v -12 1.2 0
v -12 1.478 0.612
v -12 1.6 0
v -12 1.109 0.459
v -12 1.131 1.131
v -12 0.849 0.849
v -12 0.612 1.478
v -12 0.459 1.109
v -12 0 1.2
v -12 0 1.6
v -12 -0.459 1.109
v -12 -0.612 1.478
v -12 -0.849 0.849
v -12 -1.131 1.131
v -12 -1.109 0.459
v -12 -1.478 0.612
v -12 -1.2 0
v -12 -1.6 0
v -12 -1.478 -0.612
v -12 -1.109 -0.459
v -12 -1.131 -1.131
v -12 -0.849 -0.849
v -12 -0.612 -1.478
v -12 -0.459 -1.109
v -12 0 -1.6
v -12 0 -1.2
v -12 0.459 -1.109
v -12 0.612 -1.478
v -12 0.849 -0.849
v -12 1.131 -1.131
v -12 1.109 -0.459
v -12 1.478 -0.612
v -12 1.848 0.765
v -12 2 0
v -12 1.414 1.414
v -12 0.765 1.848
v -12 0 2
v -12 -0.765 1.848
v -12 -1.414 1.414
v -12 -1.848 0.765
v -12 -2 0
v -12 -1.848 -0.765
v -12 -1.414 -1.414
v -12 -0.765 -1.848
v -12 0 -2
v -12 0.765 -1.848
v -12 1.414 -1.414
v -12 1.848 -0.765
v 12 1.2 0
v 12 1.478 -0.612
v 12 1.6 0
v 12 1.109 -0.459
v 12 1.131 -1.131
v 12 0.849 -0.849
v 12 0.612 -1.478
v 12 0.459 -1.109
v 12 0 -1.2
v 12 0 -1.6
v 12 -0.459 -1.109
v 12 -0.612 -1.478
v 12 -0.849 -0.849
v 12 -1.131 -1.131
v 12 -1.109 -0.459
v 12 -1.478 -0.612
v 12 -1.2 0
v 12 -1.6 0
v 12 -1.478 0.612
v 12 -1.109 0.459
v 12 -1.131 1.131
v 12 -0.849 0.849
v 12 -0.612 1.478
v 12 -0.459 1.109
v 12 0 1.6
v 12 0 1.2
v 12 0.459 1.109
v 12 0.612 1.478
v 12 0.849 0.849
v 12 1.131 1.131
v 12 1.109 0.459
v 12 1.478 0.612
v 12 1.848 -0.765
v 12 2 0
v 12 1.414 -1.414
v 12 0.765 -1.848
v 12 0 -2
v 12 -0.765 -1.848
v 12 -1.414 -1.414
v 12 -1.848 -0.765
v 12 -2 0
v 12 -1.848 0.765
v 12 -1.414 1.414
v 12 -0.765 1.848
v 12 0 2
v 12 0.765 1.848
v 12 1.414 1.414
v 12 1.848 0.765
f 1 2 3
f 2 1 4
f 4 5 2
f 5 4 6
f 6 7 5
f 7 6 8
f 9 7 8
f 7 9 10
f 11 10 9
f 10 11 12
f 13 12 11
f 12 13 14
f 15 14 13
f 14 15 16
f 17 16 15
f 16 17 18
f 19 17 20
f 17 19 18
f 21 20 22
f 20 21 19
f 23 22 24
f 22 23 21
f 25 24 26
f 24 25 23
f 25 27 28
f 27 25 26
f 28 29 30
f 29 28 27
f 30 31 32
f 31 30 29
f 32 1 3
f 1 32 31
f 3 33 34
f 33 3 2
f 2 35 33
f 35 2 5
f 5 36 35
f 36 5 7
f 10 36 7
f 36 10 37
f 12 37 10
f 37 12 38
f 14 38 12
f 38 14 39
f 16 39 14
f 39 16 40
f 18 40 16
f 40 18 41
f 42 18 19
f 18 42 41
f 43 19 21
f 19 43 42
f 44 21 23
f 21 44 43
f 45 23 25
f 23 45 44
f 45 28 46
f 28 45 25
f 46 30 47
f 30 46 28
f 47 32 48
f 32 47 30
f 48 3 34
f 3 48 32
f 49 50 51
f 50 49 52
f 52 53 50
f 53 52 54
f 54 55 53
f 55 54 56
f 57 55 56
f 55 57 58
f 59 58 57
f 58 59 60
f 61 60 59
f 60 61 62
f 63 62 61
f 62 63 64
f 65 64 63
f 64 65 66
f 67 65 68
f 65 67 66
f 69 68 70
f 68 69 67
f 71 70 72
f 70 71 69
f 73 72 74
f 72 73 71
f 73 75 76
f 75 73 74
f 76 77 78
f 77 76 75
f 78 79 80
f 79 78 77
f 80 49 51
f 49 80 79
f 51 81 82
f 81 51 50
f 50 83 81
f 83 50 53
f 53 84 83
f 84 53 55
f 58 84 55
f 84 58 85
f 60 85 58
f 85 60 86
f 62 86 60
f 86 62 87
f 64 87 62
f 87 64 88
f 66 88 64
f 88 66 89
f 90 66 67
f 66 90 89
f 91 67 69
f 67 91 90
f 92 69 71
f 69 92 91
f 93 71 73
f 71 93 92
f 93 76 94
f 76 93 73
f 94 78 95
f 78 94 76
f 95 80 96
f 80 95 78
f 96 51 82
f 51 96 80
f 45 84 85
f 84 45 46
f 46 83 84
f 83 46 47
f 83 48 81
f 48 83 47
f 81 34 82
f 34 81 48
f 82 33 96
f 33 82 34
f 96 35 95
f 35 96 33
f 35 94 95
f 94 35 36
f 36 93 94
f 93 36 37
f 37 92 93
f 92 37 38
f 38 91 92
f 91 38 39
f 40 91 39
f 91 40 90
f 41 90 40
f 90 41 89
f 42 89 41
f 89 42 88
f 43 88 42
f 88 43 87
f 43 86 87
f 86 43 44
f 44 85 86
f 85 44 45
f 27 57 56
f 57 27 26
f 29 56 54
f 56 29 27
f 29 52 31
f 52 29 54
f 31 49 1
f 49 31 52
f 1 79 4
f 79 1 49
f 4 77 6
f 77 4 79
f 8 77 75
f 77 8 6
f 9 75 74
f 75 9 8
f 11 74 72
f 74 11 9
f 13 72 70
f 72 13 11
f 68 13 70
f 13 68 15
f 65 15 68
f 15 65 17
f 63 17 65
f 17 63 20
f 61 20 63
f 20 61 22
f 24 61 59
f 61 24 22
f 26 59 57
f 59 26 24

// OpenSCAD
// file: ../p/4-4disc.scad
use <../lib.scad>
$fa=1; $fs=0.2;
function ldraw_lib__4_4disc(realsolid=false) = [
// 0 Disc 1.0
// 0 Name: 4-4disc.dat
// 0 Author: James Jessiman
// 0 !LDRAW_ORG Primitive UPDATE 2002-02
// 0 !LICENSE Licensed under CC BY 2.0 and CC BY 4.0 : see CAreadme.txt
// 
// 0 BFC CERTIFY CCW
  [0,"BFC","CERTIFY"],
  [0,"BFC","CCW"],
// 
// 0 !HISTORY 1998-12-15 [PTadmin] Official Update 1998-10
// 0 !HISTORY 2002-03-23 [sbliss] Added BFC statement
// 0 !HISTORY 2002-04-25 [PTadmin] Official Update 2002-02
// 0 !HISTORY 2007-06-24 [PTadmin] Header formatted for Contributor Agreement
// 0 !HISTORY 2008-07-01 [PTadmin] Official Update 2008-01
// 
// 
// 3 16 0 0 0 1 0 0 0.9239 0 0.3827
  [3,16,0,0,0,1,0,0,0.9239,0,0.3827],
// 3 16 0 0 0 0.9239 0 0.3827 0.7071 0 0.7071
  [3,16,0,0,0,0.9239,0,0.3827,0.7071,0,0.7071],
// 3 16 0 0 0 0.7071 0 0.7071 0.3827 0 0.9239
  [3,16,0,0,0,0.7071,0,0.7071,0.3827,0,0.9239],
// 3 16 0 0 0 0.3827 0 0.9239 0 0 1
  [3,16,0,0,0,0.3827,0,0.9239,0,0,1],
// 3 16 0 0 0 0 0 1 -0.3827 0 0.9239
  [3,16,0,0,0,0,0,1,-0.3827,0,0.9239],
// 3 16 0 0 0 -0.3827 0 0.9239 -0.7071 0 0.7071
  [3,16,0,0,0,-0.3827,0,0.9239,-0.7071,0,0.7071],
// 3 16 0 0 0 -0.7071 0 0.7071 -0.9239 0 0.3827
  [3,16,0,0,0,-0.7071,0,0.7071,-0.9239,0,0.3827],
// 3 16 0 0 0 -0.9239 0 0.3827 -1 0 -0
  [3,16,0,0,0,-0.9239,0,0.3827,-1,0,-0],
// 3 16 0 0 0 -1 0 -0 -0.9239 0 -0.3827
  [3,16,0,0,0,-1,0,-0,-0.9239,0,-0.3827],
// 3 16 0 0 0 -0.9239 0 -0.3827 -0.7071 0 -0.7071
  [3,16,0,0,0,-0.9239,0,-0.3827,-0.7071,0,-0.7071],
// 3 16 0 0 0 -0.7071 0 -0.7071 -0.3827 0 -0.9239
  [3,16,0,0,0,-0.7071,0,-0.7071,-0.3827,0,-0.9239],
// 3 16 0 0 0 -0.3827 0 -0.9239 0 0 -1
  [3,16,0,0,0,-0.3827,0,-0.9239,0,0,-1],
// 3 16 0 0 0 0 0 -1 0.3827 0 -0.9239
  [3,16,0,0,0,0,0,-1,0.3827,0,-0.9239],
// 3 16 0 0 0 0.3827 0 -0.9239 0.7071 0 -0.7071
  [3,16,0,0,0,0.3827,0,-0.9239,0.7071,0,-0.7071],
// 3 16 0 0 0 0.7071 0 -0.7071 0.9239 0 -0.3827
  [3,16,0,0,0,0.7071,0,-0.7071,0.9239,0,-0.3827],
// 3 16 0 0 0 0.9239 0 -0.3827 1 0 0
  [3,16,0,0,0,0.9239,0,-0.3827,1,0,0],
// 0
];
module ldraw_lib__4_4disc(step=0, col=false, unit=2/5, alt=false, line=0.2, solid=!$preview)
    makepoly(ldraw_lib__4_4disc(solid), step=step, col=col, unit=unit, alt=alt, line=line, solid=solid);
ldraw_lib__4_4disc(line=0.2);
// file: ../p/stud3.scad
use <../lib.scad>
use <4-4cyli.scad>
use <4-4disc.scad>
use <4-4edge.scad>
$fa=1; $fs=0.2;
function ldraw_lib__stud3(realsolid=false) = realsolid ? 
    [openscad(translate([0,0,-eps()], o=cylinder(4+eps(), r=4)),2)] : [
// 0 Stud Tube Solid
// 0 Name: stud3.dat
// 0 Author: James Jessiman
// 0 !LDRAW_ORG Primitive UPDATE 2012-01
// 0 !LICENSE Licensed under CC BY 2.0 and CC BY 4.0 : see CAreadme.txt
// 
// 0 BFC CERTIFY CCW
  [0,"BFC","CERTIFY"],
  [0,"BFC","CCW"],
// 
// 0 !HISTORY 2002-04-04 [sbliss] Modified for BFC compliance
// 0 !HISTORY 2002-04-25 [PTadmin] Official Update 2002-02
// 0 !HISTORY 2007-06-24 [PTadmin] Header formatted for Contributor Agreement
// 0 !HISTORY 2008-07-01 [PTadmin] Official Update 2008-01
// 0 !HISTORY 2012-02-16 [Philo] Changed to CCW
// 0 !HISTORY 2012-03-30 [PTadmin] Official Update 2012-01
// 
// 
// 1 16 0 -4 0 4 0 0 0 1 0 0 0 4 4-4edge.dat
  [1,16,0,-4,0,4,0,0,0,1,0,0,0,4, ldraw_lib__4_4edge(realsolid)],
// 1 16 0 0 0 4 0 0 0 1 0 0 0 4 4-4edge.dat
  [1,16,0,0,0,4,0,0,0,1,0,0,0,4, ldraw_lib__4_4edge(realsolid)],
// 1 16 0 -4 0 4 0 0 0 1 0 0 0 4 4-4disc.dat
  [1,16,0,-4,0,4,0,0,0,1,0,0,0,4, ldraw_lib__4_4disc(realsolid)],
// 1 16 0 -4 0 4 0 0 0 4 0 0 0 4 4-4cyli.dat
  [1,16,0,-4,0,4,0,0,0,4,0,0,0,4, ldraw_lib__4_4cyli(realsolid)],
];
module ldraw_lib__stud3(step=0, col=false, unit=2/5, alt=false, line=0.2, solid=!$preview)
    makepoly(ldraw_lib__stud3(solid), step=step, col=col, unit=unit, alt=alt, line=line, solid=solid);
ldraw_lib__stud3(line=0.2);
// file: ../p/stud.scad
use <../lib.scad>
use <4-4cyli.scad>
use <4-4disc.scad>
use <4-4edge.scad>
$fa=1; $fs=0.2;
function ldraw_lib__stud(realsolid=false) = realsolid ? 
    [openscad(translate([0,0,-eps()], o=cylinder(4+eps(), r=6)),2)] : [
// 0 Stud
// 0 Name: stud.dat
// 0 Author: James Jessiman
// 0 !LDRAW_ORG Primitive UPDATE 2012-01
// 0 !LICENSE Licensed under CC BY 2.0 and CC BY 4.0 : see CAreadme.txt
// 
// 0 BFC CERTIFY CCW
  [0,"BFC","CERTIFY"],
  [0,"BFC","CCW"],
// 
// 0 !HISTORY 2002-04-04 [sbliss] Modified for BFC compliance
// 0 !HISTORY 2002-04-25 [PTadmin] Official Update 2002-02
// 0 !HISTORY 2007-06-24 [PTadmin] Header formatted for Contributor Agreement
// 0 !HISTORY 2008-07-01 [PTadmin] Official Update 2008-01
// 0 !HISTORY 2012-02-16 [Philo] Changed to CCW
// 0 !HISTORY 2012-03-30 [PTadmin] Official Update 2012-01
// 
// 
// 1 16 0 0 0 6 0 0 0 1 0 0 0 6 4-4edge.dat
  [1,16,0,0,0,6,0,0,0,1,0,0,0,6, ldraw_lib__4_4edge(realsolid)],
// 1 16 0 -4 0 6 0 0 0 1 0 0 0 6 4-4edge.dat
  [1,16,0,-4,0,6,0,0,0,1,0,0,0,6, ldraw_lib__4_4edge(realsolid)],
// 1 16 0 0 0 6 0 0 0 -4 0 0 0 6 4-4cyli.dat
  [1,16,0,0,0,6,0,0,0,-4,0,0,0,6, ldraw_lib__4_4cyli(realsolid)],
// 1 16 0 -4 0 6 0 0 0 1 0 0 0 6 4-4disc.dat
  [1,16,0,-4,0,6,0,0,0,1,0,0,0,6, ldraw_lib__4_4disc(realsolid)],
];
module ldraw_lib__stud(step=0, col=false, unit=2/5, alt=false, line=0.2, solid=!$preview)
    makepoly(ldraw_lib__stud(solid), step=step, col=col, unit=unit, alt=alt, line=line, solid=solid);
ldraw_lib__stud(line=0.2);
// file: ../p/box5.scad
use <../lib.scad>
$fa=1; $fs=0.2;
function ldraw_lib__box5(realsolid=false) = [
// 0 Box with 5 Faces and All Edges
// 0 Name: box5.dat
// 0 Author: James Jessiman
// 0 !LDRAW_ORG Primitive UPDATE 2012-01
// 0 !LICENSE Licensed under CC BY 2.0 and CC BY 4.0 : see CAreadme.txt
// 
// 0 BFC CERTIFY CCW
  [0,"BFC","CERTIFY"],
  [0,"BFC","CCW"],
// 
// 0 !HISTORY 2002-04-03 [sbliss] Modified for BFC compliance
// 0 !HISTORY 2002-04-25 [PTadmin] Official Update 2002-02
// 0 !HISTORY 2007-06-24 [PTadmin] Header formatted for Contributor Agreement
// 0 !HISTORY 2008-07-01 [PTadmin] Official Update 2008-01
// 0 !HISTORY 2012-02-16 [Philo] Changed to CCW
// 0 !HISTORY 2012-03-30 [PTadmin] Official Update 2012-01
// 
// 
// 2 24 1 1 1 -1 1 1
  [2,24,1,1,1,-1,1,1],
// 2 24 -1 1 1 -1 1 -1
  [2,24,-1,1,1,-1,1,-1],
// 2 24 -1 1 -1 1 1 -1
  [2,24,-1,1,-1,1,1,-1],
// 2 24 1 1 -1 1 1 1
  [2,24,1,1,-1,1,1,1],
// 2 24 1 0 1 -1 0 1
  [2,24,1,0,1,-1,0,1],
// 2 24 -1 0 1 -1 0 -1
  [2,24,-1,0,1,-1,0,-1],
// 2 24 -1 0 -1 1 0 -1
  [2,24,-1,0,-1,1,0,-1],
// 2 24 1 0 -1 1 0 1
  [2,24,1,0,-1,1,0,1],
// 2 24 1 0 1 1 1 1
  [2,24,1,0,1,1,1,1],
// 2 24 -1 0 1 -1 1 1
  [2,24,-1,0,1,-1,1,1],
// 2 24 1 0 -1 1 1 -1
  [2,24,1,0,-1,1,1,-1],
// 2 24 -1 0 -1 -1 1 -1
  [2,24,-1,0,-1,-1,1,-1],
// 4 16 -1 1 1 1 1 1 1 1 -1 -1 1 -1
  [4,16,-1,1,1,1,1,1,1,1,-1,-1,1,-1],
// 4 16 -1 1 1 -1 0 1 1 0 1 1 1 1
  [4,16,-1,1,1,-1,0,1,1,0,1,1,1,1],
// 4 16 -1 1 -1 -1 0 -1 -1 0 1 -1 1 1
  [4,16,-1,1,-1,-1,0,-1,-1,0,1,-1,1,1],
// 4 16 1 1 -1 1 0 -1 -1 0 -1 -1 1 -1
  [4,16,1,1,-1,1,0,-1,-1,0,-1,-1,1,-1],
// 4 16 1 1 1 1 0 1 1 0 -1 1 1 -1
  [4,16,1,1,1,1,0,1,1,0,-1,1,1,-1],
];
module ldraw_lib__box5(step=0, col=false, unit=2/5, alt=false, line=0.2, solid=!$preview)
    makepoly(ldraw_lib__box5(solid), step=step, col=col, unit=unit, alt=alt, line=line, solid=solid);
ldraw_lib__box5(line=0.2);
// file: ../p/box4t.scad
use <../lib.scad>
$fa=1; $fs=0.2;
function ldraw_lib__box4t(realsolid=false) = [
// 0 Box with 4 Adjacent Faces and All Edges
// 0 Name: box4t.dat
// 0 Author: Tore Eriksson [Tore_Eriksson]
// 0 !LDRAW_ORG Primitive UPDATE 2003-02
// 0 !LICENSE Licensed under CC BY 2.0 and CC BY 4.0 : see CAreadme.txt
// 
// 0 BFC CERTIFY CCW
  [0,"BFC","CERTIFY"],
  [0,"BFC","CCW"],
// 
// 0 !HISTORY 1997-09-29 [PTadmin] Official Update 1997-15
// 0 !HISTORY 2002-08-31 [izanette] Modified with WINDZ for BFC compliance
// 0 !HISTORY 2003-08-01 [PTadmin] Official Update 2003-02
// 0 !HISTORY 2007-06-24 [PTadmin] Header formatted for Contributor Agreement
// 0 !HISTORY 2008-07-01 [PTadmin] Official Update 2008-01
// 
// 
// 2 24 1 1 1 -1 1 1
  [2,24,1,1,1,-1,1,1],
// 2 24 -1 1 1 -1 1 -1
  [2,24,-1,1,1,-1,1,-1],
// 2 24 -1 1 -1 1 1 -1
  [2,24,-1,1,-1,1,1,-1],
// 2 24 1 1 -1 1 1 1
  [2,24,1,1,-1,1,1,1],
// 2 24 1 0 1 -1 0 1
  [2,24,1,0,1,-1,0,1],
// 2 24 -1 0 1 -1 0 -1
  [2,24,-1,0,1,-1,0,-1],
// 2 24 -1 0 -1 1 0 -1
  [2,24,-1,0,-1,1,0,-1],
// 2 24 1 0 -1 1 0 1
  [2,24,1,0,-1,1,0,1],
// 2 24 1 0 1 1 1 1
  [2,24,1,0,1,1,1,1],
// 2 24 -1 0 1 -1 1 1
  [2,24,-1,0,1,-1,1,1],
// 2 24 1 0 -1 1 1 -1
  [2,24,1,0,-1,1,1,-1],
// 2 24 -1 0 -1 -1 1 -1
  [2,24,-1,0,-1,-1,1,-1],
// 4 16 1 1 1 1 1 -1 -1 1 -1 -1 1 1
  [4,16,1,1,1,1,1,-1,-1,1,-1,-1,1,1],
// 4 16 1 1 1 -1 1 1 -1 0 1 1 0 1
  [4,16,1,1,1,-1,1,1,-1,0,1,1,0,1],
// 4 16 -1 1 1 -1 1 -1 -1 0 -1 -1 0 1
  [4,16,-1,1,1,-1,1,-1,-1,0,-1,-1,0,1],
// 0 4 16 -1 1 -1 -1 0 -1 1 0 -1 1 1 -1
// 4 16 1 1 -1 1 1 1 1 0 1 1 0 -1
  [4,16,1,1,-1,1,1,1,1,0,1,1,0,-1],
// 0
];
module ldraw_lib__box4t(step=0, col=false, unit=2/5, alt=false, line=0.2, solid=!$preview)
    makepoly(ldraw_lib__box4t(solid), step=step, col=col, unit=unit, alt=alt, line=line, solid=solid);
ldraw_lib__box4t(line=0.2);
// file: s/3004s01.scad
use <../../lib.scad>
use <../../p/box4t.scad>
use <../../p/box5.scad>
use <../../p/stud.scad>
use <../../p/stud3.scad>
$fa=1; $fs=0.2;
function ldraw_lib__s__3004s01(realsolid=false) = [
// 0 ~Brick  1 x  2 without Front Face
// 0 Name: s\3004s01.dat
// 0 Author: James Jessiman
// 0 !LDRAW_ORG Subpart UPDATE 2003-03
// 0 !LICENSE Licensed under CC BY 2.0 and CC BY 4.0 : see CAreadme.txt
// 
// 0 BFC CERTIFY CCW
  [0,"BFC","CERTIFY"],
  [0,"BFC","CCW"],
// 
// 0 !HISTORY 2003-09-07 [jriley] Subfiling, BFC
// 0 !HISTORY 2003-12-19 [PTadmin] Official Update 2003-03
// 0 !HISTORY 2007-08-29 [PTadmin] Header formatted for Contributor Agreement
// 0 !HISTORY 2008-07-01 [PTadmin] Official Update 2008-01
// 
// 
// 1 16 0 4 0 1 0 0 0 -5 0 0 0 1 stud3.dat
  [1,16,0,4,0,1,0,0,0,-5,0,0,0,1, ldraw_lib__stud3(realsolid)],
// 0 BFC INVERTNEXT
  [0,"BFC","INVERTNEXT"],
// 1 16 0 24 0 16 0 0 0 -20 0 0 0 6 box5.dat
  [1,16,0,24,0,16,0,0,0,-20,0,0,0,6, ldraw_lib__box5(realsolid)],
// 4 16 20 24 10 16 24 6 -16 24 6 -20 24 10
  [4,16,20,24,10,16,24,6,-16,24,6,-20,24,10],
// 4 16 -20 24 10 -16 24 6 -16 24 -6 -20 24 -10
  [4,16,-20,24,10,-16,24,6,-16,24,-6,-20,24,-10],
// 4 16 -20 24 -10 -16 24 -6 16 24 -6 20 24 -10
  [4,16,-20,24,-10,-16,24,-6,16,24,-6,20,24,-10],
// 4 16 20 24 -10 16 24 -6 16 24 6 20 24 10
  [4,16,20,24,-10,16,24,-6,16,24,6,20,24,10],
// 1 16 0 24 0 20 0 0 0 -24 0 0 0 10 box4t.dat
  [1,16,0,24,0,20,0,0,0,-24,0,0,0,10, ldraw_lib__box4t(realsolid)],
// 1 16 10 0 0 1 0 0 0 1 0 0 0 1 stud.dat
  [1,16,10,0,0,1,0,0,0,1,0,0,0,1, ldraw_lib__stud(realsolid)],
// 1 16 -10 0 0 1 0 0 0 1 0 0 0 1 stud.dat
  [1,16,-10,0,0,1,0,0,0,1,0,0,0,1, ldraw_lib__stud(realsolid)],
// 0
];
module ldraw_lib__s__3004s01(step=0, col=false, unit=2/5, alt=false, line=0.2, solid=!$preview)
    makepoly(ldraw_lib__s__3004s01(solid), step=step, col=col, unit=unit, alt=alt, line=line, solid=solid);
ldraw_lib__s__3004s01(line=0.2);
// file: ../p/4-4cyli.scad
use <../lib.scad>
$fa=1; $fs=0.2;
function ldraw_lib__4_4cyli(realsolid=false) = [
// 0 Cylinder 1.0
// 0 Name: 4-4cyli.dat
// 0 Author: James Jessiman
// 0 !LDRAW_ORG Primitive UPDATE 2005-01
// 0 !LICENSE Licensed under CC BY 2.0 and CC BY 4.0 : see CAreadme.txt
// 
// 0 BFC CERTIFY CCW
  [0,"BFC","CERTIFY"],
  [0,"BFC","CCW"],
// 
// 0 !HISTORY 1998-12-15 [PTadmin] Official Update 1998-10
// 0 !HISTORY 2002-03-23 [sbliss] Added BFC statement; merged headers from files in distributions LDraw 0.27 and Complete.
// 0 !HISTORY 2002-04-25 [PTadmin] Official Update 2002-02
// 0 !HISTORY 2004-12-14 [guyvivan] BFC CCW
// 0 !HISTORY 2005-12-28 [PTadmin] Official Update 2005-01
// 0 !HISTORY 2007-06-24 [PTadmin] Header formatted for Contributor Agreement
// 0 !HISTORY 2008-07-01 [PTadmin] Official Update 2008-01
// 
// 
// 4 16 1 1 0 0.9239 1 0.3827 0.9239 0 0.3827 1 0 0
  [4,16,1,1,0,0.9239,1,0.3827,0.9239,0,0.3827,1,0,0],
// 5 24 1 0 0 1 1 0 0.9239 0 0.3827 0.9239 0 -0.3827
  [5,24,1,0,0,1,1,0,0.9239,0,0.3827,0.9239,0,-0.3827],
// 4 16 0.9239 1 0.3827 0.7071 1 0.7071 0.7071 0 0.7071 0.9239 0 0.3827
  [4,16,0.9239,1,0.3827,0.7071,1,0.7071,0.7071,0,0.7071,0.9239,0,0.3827],
// 5 24 0.9239 0 0.3827 0.9239 1 0.3827 0.7071 0 0.7071 1 0 0
  [5,24,0.9239,0,0.3827,0.9239,1,0.3827,0.7071,0,0.7071,1,0,0],
// 4 16 0.7071 1 0.7071 0.3827 1 0.9239 0.3827 0 0.9239 0.7071 0 0.7071
  [4,16,0.7071,1,0.7071,0.3827,1,0.9239,0.3827,0,0.9239,0.7071,0,0.7071],
// 5 24 0.7071 0 0.7071 0.7071 1 0.7071 0.3827 0 0.9239 0.9239 0 0.3827
  [5,24,0.7071,0,0.7071,0.7071,1,0.7071,0.3827,0,0.9239,0.9239,0,0.3827],
// 4 16 0.3827 1 0.9239 0 1 1 0 0 1 0.3827 0 0.9239
  [4,16,0.3827,1,0.9239,0,1,1,0,0,1,0.3827,0,0.9239],
// 5 24 0.3827 0 0.9239 0.3827 1 0.9239 0 0 1 0.7071 0 0.7071
  [5,24,0.3827,0,0.9239,0.3827,1,0.9239,0,0,1,0.7071,0,0.7071],
// 4 16 0 1 1 -0.3827 1 0.9239 -0.3827 0 0.9239 0 0 1
  [4,16,0,1,1,-0.3827,1,0.9239,-0.3827,0,0.9239,0,0,1],
// 5 24 0 0 1 0 1 1 -0.3827 0 0.9239 0.3827 0 0.9239
  [5,24,0,0,1,0,1,1,-0.3827,0,0.9239,0.3827,0,0.9239],
// 4 16 -0.3827 1 0.9239 -0.7071 1 0.7071 -0.7071 0 0.7071 -0.3827 0 0.9239
  [4,16,-0.3827,1,0.9239,-0.7071,1,0.7071,-0.7071,0,0.7071,-0.3827,0,0.9239],
// 5 24 -0.3827 0 0.9239 -0.3827 1 0.9239 -0.7071 0 0.7071 0 0 1
  [5,24,-0.3827,0,0.9239,-0.3827,1,0.9239,-0.7071,0,0.7071,0,0,1],
// 4 16 -0.7071 1 0.7071 -0.9239 1 0.3827 -0.9239 0 0.3827 -0.7071 0 0.7071
  [4,16,-0.7071,1,0.7071,-0.9239,1,0.3827,-0.9239,0,0.3827,-0.7071,0,0.7071],
// 5 24 -0.7071 0 0.7071 -0.7071 1 0.7071 -0.9239 0 0.3827 -0.3827 0 0.9239
  [5,24,-0.7071,0,0.7071,-0.7071,1,0.7071,-0.9239,0,0.3827,-0.3827,0,0.9239],
// 4 16 -0.9239 1 0.3827 -1 1 0 -1 0 0 -0.9239 0 0.3827
  [4,16,-0.9239,1,0.3827,-1,1,0,-1,0,0,-0.9239,0,0.3827],
// 5 24 -0.9239 0 0.3827 -0.9239 1 0.3827 -1 0 0 -0.7071 0 0.7071
  [5,24,-0.9239,0,0.3827,-0.9239,1,0.3827,-1,0,0,-0.7071,0,0.7071],
// 4 16 -1 1 0 -0.9239 1 -0.3827 -0.9239 0 -0.3827 -1 0 0
  [4,16,-1,1,0,-0.9239,1,-0.3827,-0.9239,0,-0.3827,-1,0,0],
// 5 24 -1 0 0 -1 1 0 -0.9239 0 -0.3827 -0.9239 0 0.3827
  [5,24,-1,0,0,-1,1,0,-0.9239,0,-0.3827,-0.9239,0,0.3827],
// 4 16 -0.9239 1 -0.3827 -0.7071 1 -0.7071 -0.7071 0 -0.7071 -0.9239 0 -0.3827
  [4,16,-0.9239,1,-0.3827,-0.7071,1,-0.7071,-0.7071,0,-0.7071,-0.9239,0,-0.3827],
// 5 24 -0.9239 0 -0.3827 -0.9239 1 -0.3827 -0.7071 0 -0.7071 -1 0 0
  [5,24,-0.9239,0,-0.3827,-0.9239,1,-0.3827,-0.7071,0,-0.7071,-1,0,0],
// 4 16 -0.7071 1 -0.7071 -0.3827 1 -0.9239 -0.3827 0 -0.9239 -0.7071 0 -0.7071
  [4,16,-0.7071,1,-0.7071,-0.3827,1,-0.9239,-0.3827,0,-0.9239,-0.7071,0,-0.7071],
// 5 24 -0.7071 0 -0.7071 -0.7071 1 -0.7071 -0.3827 0 -0.9239 -0.9239 0 -0.3827
  [5,24,-0.7071,0,-0.7071,-0.7071,1,-0.7071,-0.3827,0,-0.9239,-0.9239,0,-0.3827],
// 4 16 -0.3827 1 -0.9239 0 1 -1 0 0 -1 -0.3827 0 -0.9239
  [4,16,-0.3827,1,-0.9239,0,1,-1,0,0,-1,-0.3827,0,-0.9239],
// 5 24 -0.3827 0 -0.9239 -0.3827 1 -0.9239 0 0 -1 -0.7071 0 -0.7071
  [5,24,-0.3827,0,-0.9239,-0.3827,1,-0.9239,0,0,-1,-0.7071,0,-0.7071],
// 4 16 0 1 -1 0.3827 1 -0.9239 0.3827 0 -0.9239 0 0 -1
  [4,16,0,1,-1,0.3827,1,-0.9239,0.3827,0,-0.9239,0,0,-1],
// 5 24 0 0 -1 0 1 -1 0.3827 0 -0.9239 -0.3827 0 -0.9239
  [5,24,0,0,-1,0,1,-1,0.3827,0,-0.9239,-0.3827,0,-0.9239],
// 4 16 0.3827 1 -0.9239 0.7071 1 -0.7071 0.7071 0 -0.7071 0.3827 0 -0.9239
  [4,16,0.3827,1,-0.9239,0.7071,1,-0.7071,0.7071,0,-0.7071,0.3827,0,-0.9239],
// 5 24 0.3827 0 -0.9239 0.3827 1 -0.9239 0.7071 0 -0.7071 0 0 -1
  [5,24,0.3827,0,-0.9239,0.3827,1,-0.9239,0.7071,0,-0.7071,0,0,-1],
// 4 16 0.7071 1 -0.7071 0.9239 1 -0.3827 0.9239 0 -0.3827 0.7071 0 -0.7071
  [4,16,0.7071,1,-0.7071,0.9239,1,-0.3827,0.9239,0,-0.3827,0.7071,0,-0.7071],
// 5 24 0.7071 0 -0.7071 0.7071 1 -0.7071 0.9239 0 -0.3827 0.3827 0 -0.9239
  [5,24,0.7071,0,-0.7071,0.7071,1,-0.7071,0.9239,0,-0.3827,0.3827,0,-0.9239],
// 4 16 0.9239 1 -0.3827 1 1 0 1 0 0 0.9239 0 -0.3827
  [4,16,0.9239,1,-0.3827,1,1,0,1,0,0,0.9239,0,-0.3827],
// 5 24 0.9239 0 -0.3827 0.9239 1 -0.3827 1 0 0 0.7071 0 -0.7071
  [5,24,0.9239,0,-0.3827,0.9239,1,-0.3827,1,0,0,0.7071,0,-0.7071],
// 0
];
module ldraw_lib__4_4cyli(step=0, col=false, unit=2/5, alt=false, line=0.2, solid=!$preview)
    makepoly(ldraw_lib__4_4cyli(solid), step=step, col=col, unit=unit, alt=alt, line=line, solid=solid);
ldraw_lib__4_4cyli(line=0.2);
// file: ../p/4-4ring4.scad
use <../lib.scad>
$fa=1; $fs=0.2;
function ldraw_lib__4_4ring4(realsolid=false) = [
// 0 Ring  4 x 1.0
// 0 Name: 4-4ring4.dat
// 0 Author: James Jessiman
// 0 !LDRAW_ORG Primitive UPDATE 2009-01
// 0 !LICENSE Licensed under CC BY 2.0 and CC BY 4.0 : see CAreadme.txt
// 
// 0 BFC CERTIFY CCW
  [0,"BFC","CERTIFY"],
  [0,"BFC","CCW"],
// 
// 0 !HISTORY 1998-12-15 [PTadmin] Official Update 1998-10
// 0 !HISTORY 2002-04-08 [BrickCaster] Modified for BFC compliance
// 0 !HISTORY 2002-04-25 [PTadmin] Official Update 2002-02
// 0 !HISTORY 2007-06-24 [PTadmin] Header formatted for Contributor Agreement
// 0 !HISTORY 2008-07-01 [PTadmin] Official Update 2008-01
// 0 !HISTORY 2008-08-26 [cwdee] Switch polygon winding and rename
// 0 !HISTORY 2009-05-02 [PTadmin] Official Update 2009-01
// 
// 
// 4 16 -1.9135 0 4.6195 -1.5308 0 3.6956 0 0 4 0 0 5
  [4,16,-1.9135,0,4.6195,-1.5308,0,3.6956,0,0,4,0,0,5],
// 4 16 -3.5355 0 3.5355 -2.8284 0 2.8284 -1.5308 0 3.6956 -1.9135 0 4.6195
  [4,16,-3.5355,0,3.5355,-2.8284,0,2.8284,-1.5308,0,3.6956,-1.9135,0,4.6195],
// 4 16 -4.6195 0 1.9135 -3.6956 0 1.5308 -2.8284 0 2.8284 -3.5355 0 3.5355
  [4,16,-4.6195,0,1.9135,-3.6956,0,1.5308,-2.8284,0,2.8284,-3.5355,0,3.5355],
// 4 16 -5 0 0 -4 0 0 -3.6956 0 1.5308 -4.6195 0 1.9135
  [4,16,-5,0,0,-4,0,0,-3.6956,0,1.5308,-4.6195,0,1.9135],
// 4 16 -4.6195 0 -1.9135 -3.6956 0 -1.5308 -4 0 0 -5 0 0
  [4,16,-4.6195,0,-1.9135,-3.6956,0,-1.5308,-4,0,0,-5,0,0],
// 4 16 -3.5355 0 -3.5355 -2.8284 0 -2.8284 -3.6956 0 -1.5308 -4.6195 0 -1.9135
  [4,16,-3.5355,0,-3.5355,-2.8284,0,-2.8284,-3.6956,0,-1.5308,-4.6195,0,-1.9135],
// 4 16 -1.9135 0 -4.6195 -1.5308 0 -3.6956 -2.8284 0 -2.8284 -3.5355 0 -3.5355
  [4,16,-1.9135,0,-4.6195,-1.5308,0,-3.6956,-2.8284,0,-2.8284,-3.5355,0,-3.5355],
// 4 16 0 0 -5 0 0 -4 -1.5308 0 -3.6956 -1.9135 0 -4.6195
  [4,16,0,0,-5,0,0,-4,-1.5308,0,-3.6956,-1.9135,0,-4.6195],
// 4 16 1.9135 0 -4.6195 1.5308 0 -3.6956 0 0 -4 0 0 -5
  [4,16,1.9135,0,-4.6195,1.5308,0,-3.6956,0,0,-4,0,0,-5],
// 4 16 3.5355 0 -3.5355 2.8284 0 -2.8284 1.5308 0 -3.6956 1.9135 0 -4.6195
  [4,16,3.5355,0,-3.5355,2.8284,0,-2.8284,1.5308,0,-3.6956,1.9135,0,-4.6195],
// 4 16 4.6195 0 -1.9135 3.6956 0 -1.5308 2.8284 0 -2.8284 3.5355 0 -3.5355
  [4,16,4.6195,0,-1.9135,3.6956,0,-1.5308,2.8284,0,-2.8284,3.5355,0,-3.5355],
// 4 16 5 0 0 4 0 0 3.6956 0 -1.5308 4.6195 0 -1.9135
  [4,16,5,0,0,4,0,0,3.6956,0,-1.5308,4.6195,0,-1.9135],
// 4 16 4.6195 0 1.9135 3.6956 0 1.5308 4 0 0 5 0 0
  [4,16,4.6195,0,1.9135,3.6956,0,1.5308,4,0,0,5,0,0],
// 4 16 3.5355 0 3.5355 2.8284 0 2.8284 3.6956 0 1.5308 4.6195 0 1.9135
  [4,16,3.5355,0,3.5355,2.8284,0,2.8284,3.6956,0,1.5308,4.6195,0,1.9135],
// 4 16 1.9135 0 4.6195 1.5308 0 3.6956 2.8284 0 2.8284 3.5355 0 3.5355
  [4,16,1.9135,0,4.6195,1.5308,0,3.6956,2.8284,0,2.8284,3.5355,0,3.5355],
// 4 16 0 0 5 0 0 4 1.5308 0 3.6956 1.9135 0 4.6195
  [4,16,0,0,5,0,0,4,1.5308,0,3.6956,1.9135,0,4.6195],
// 0
];
module ldraw_lib__4_4ring4(step=0, col=false, unit=2/5, alt=false, line=0.2, solid=!$preview)
    makepoly(ldraw_lib__4_4ring4(solid), step=step, col=col, unit=unit, alt=alt, line=line, solid=solid);
ldraw_lib__4_4ring4(line=0.2);
// file: ../p/4-4ring3.scad
use <../lib.scad>
$fa=1; $fs=0.2;
function ldraw_lib__4_4ring3(realsolid=false) = [
// 0 Ring  3 x 1.0
// 0 Name: 4-4ring3.dat
// 0 Author: James Jessiman
// 0 !LDRAW_ORG Primitive UPDATE 2009-01
// 0 !LICENSE Licensed under CC BY 2.0 and CC BY 4.0 : see CAreadme.txt
// 
// 0 BFC CERTIFY CCW
  [0,"BFC","CERTIFY"],
  [0,"BFC","CCW"],
// 
// 0 !HISTORY 1998-12-15 [PTadmin] Official Update 1998-10
// 0 !HISTORY 2002-04-05 [hafhead] Added BFC statement
// 0 !HISTORY 2002-04-25 [PTadmin] Official Update 2002-02
// 0 !HISTORY 2007-06-24 [PTadmin] Header formatted for Contributor Agreement
// 0 !HISTORY 2008-07-01 [PTadmin] Official Update 2008-01
// 0 !HISTORY 2008-08-26 [cwdee] Switch polygon winding and rename
// 0 !HISTORY 2009-05-02 [PTadmin] Official Update 2009-01
// 
// 
// 4 16 -1.5308 0 3.6956 -1.1481 0 2.7717 0 0 3 0 0 4
  [4,16,-1.5308,0,3.6956,-1.1481,0,2.7717,0,0,3,0,0,4],
// 4 16 -2.8284 0 2.8284 -2.1213 0 2.1213 -1.1481 0 2.7717 -1.5308 0 3.6956
  [4,16,-2.8284,0,2.8284,-2.1213,0,2.1213,-1.1481,0,2.7717,-1.5308,0,3.6956],
// 4 16 -3.6956 0 1.5308 -2.7717 0 1.1481 -2.1213 0 2.1213 -2.8284 0 2.8284
  [4,16,-3.6956,0,1.5308,-2.7717,0,1.1481,-2.1213,0,2.1213,-2.8284,0,2.8284],
// 4 16 -4 0 0 -3 0 0 -2.7717 0 1.1481 -3.6956 0 1.5308
  [4,16,-4,0,0,-3,0,0,-2.7717,0,1.1481,-3.6956,0,1.5308],
// 4 16 -3.6956 0 -1.5308 -2.7717 0 -1.1481 -3 0 0 -4 0 0
  [4,16,-3.6956,0,-1.5308,-2.7717,0,-1.1481,-3,0,0,-4,0,0],
// 4 16 -2.8284 0 -2.8284 -2.1213 0 -2.1213 -2.7717 0 -1.1481 -3.6956 0 -1.5308
  [4,16,-2.8284,0,-2.8284,-2.1213,0,-2.1213,-2.7717,0,-1.1481,-3.6956,0,-1.5308],
// 4 16 -1.5308 0 -3.6956 -1.1481 0 -2.7717 -2.1213 0 -2.1213 -2.8284 0 -2.8284
  [4,16,-1.5308,0,-3.6956,-1.1481,0,-2.7717,-2.1213,0,-2.1213,-2.8284,0,-2.8284],
// 4 16 0 0 -4 0 0 -3 -1.1481 0 -2.7717 -1.5308 0 -3.6956
  [4,16,0,0,-4,0,0,-3,-1.1481,0,-2.7717,-1.5308,0,-3.6956],
// 4 16 1.5308 0 -3.6956 1.1481 0 -2.7717 0 0 -3 0 0 -4
  [4,16,1.5308,0,-3.6956,1.1481,0,-2.7717,0,0,-3,0,0,-4],
// 4 16 2.8284 0 -2.8284 2.1213 0 -2.1213 1.1481 0 -2.7717 1.5308 0 -3.6956
  [4,16,2.8284,0,-2.8284,2.1213,0,-2.1213,1.1481,0,-2.7717,1.5308,0,-3.6956],
// 4 16 3.6956 0 -1.5308 2.7717 0 -1.1481 2.1213 0 -2.1213 2.8284 0 -2.8284
  [4,16,3.6956,0,-1.5308,2.7717,0,-1.1481,2.1213,0,-2.1213,2.8284,0,-2.8284],
// 4 16 4 0 0 3 0 0 2.7717 0 -1.1481 3.6956 0 -1.5308
  [4,16,4,0,0,3,0,0,2.7717,0,-1.1481,3.6956,0,-1.5308],
// 4 16 3.6956 0 1.5308 2.7717 0 1.1481 3 0 0 4 0 0
  [4,16,3.6956,0,1.5308,2.7717,0,1.1481,3,0,0,4,0,0],
// 4 16 2.8284 0 2.8284 2.1213 0 2.1213 2.7717 0 1.1481 3.6956 0 1.5308
  [4,16,2.8284,0,2.8284,2.1213,0,2.1213,2.7717,0,1.1481,3.6956,0,1.5308],
// 4 16 1.5308 0 3.6956 1.1481 0 2.7717 2.1213 0 2.1213 2.8284 0 2.8284
  [4,16,1.5308,0,3.6956,1.1481,0,2.7717,2.1213,0,2.1213,2.8284,0,2.8284],
// 4 16 0 0 4 0 0 3 1.1481 0 2.7717 1.5308 0 3.6956
  [4,16,0,0,4,0,0,3,1.1481,0,2.7717,1.5308,0,3.6956],
// 0
];
module ldraw_lib__4_4ring3(step=0, col=false, unit=2/5, alt=false, line=0.2, solid=!$preview)
    makepoly(ldraw_lib__4_4ring3(solid), step=step, col=col, unit=unit, alt=alt, line=line, solid=solid);
ldraw_lib__4_4ring3(line=0.2);
// file: ../p/4-4edge.scad
use <../lib.scad>
$fa=1; $fs=0.2;
function ldraw_lib__4_4edge(realsolid=false) = [
// 0 Circle 1.0
// 0 Name: 4-4edge.dat
// 0 Author: James Jessiman
// 0 !LDRAW_ORG Primitive UPDATE 2017-01
// 0 !LICENSE Licensed under CC BY 2.0 and CC BY 4.0 : see CAreadme.txt
// 
// 0 BFC CERTIFY CCW
  [0,"BFC","CERTIFY"],
  [0,"BFC","CCW"],
// 
// 0 !HISTORY 1998-12-15 [PTadmin] Official Update 1998-10
// 0 !HISTORY 2005-12-28 [PTadmin] Official Update 2005-01
// 0 !HISTORY 2007-06-24 [PTadmin] Header formatted for Contributor Agreement
// 0 !HISTORY 2008-07-01 [PTadmin] Official Update 2008-01
// 0 !HISTORY 2017-01-15 [Steffen] BFCed
// 0 !HISTORY 2017-12-30 [PTadmin] Official Update 2017-01
// 
// 
// 2 24 1 0 0 0.9239 0 0.3827
  [2,24,1,0,0,0.9239,0,0.3827],
// 2 24 0.9239 0 0.3827 0.7071 0 0.7071
  [2,24,0.9239,0,0.3827,0.7071,0,0.7071],
// 2 24 0.7071 0 0.7071 0.3827 0 0.9239
  [2,24,0.7071,0,0.7071,0.3827,0,0.9239],
// 2 24 0.3827 0 0.9239 0 0 1
  [2,24,0.3827,0,0.9239,0,0,1],
// 2 24 0 0 1 -0.3827 0 0.9239
  [2,24,0,0,1,-0.3827,0,0.9239],
// 2 24 -0.3827 0 0.9239 -0.7071 0 0.7071
  [2,24,-0.3827,0,0.9239,-0.7071,0,0.7071],
// 2 24 -0.7071 0 0.7071 -0.9239 0 0.3827
  [2,24,-0.7071,0,0.7071,-0.9239,0,0.3827],
// 2 24 -0.9239 0 0.3827 -1 0 -0
  [2,24,-0.9239,0,0.3827,-1,0,-0],
// 2 24 -1 0 -0 -0.9239 0 -0.3827
  [2,24,-1,0,-0,-0.9239,0,-0.3827],
// 2 24 -0.9239 0 -0.3827 -0.7071 0 -0.7071
  [2,24,-0.9239,0,-0.3827,-0.7071,0,-0.7071],
// 2 24 -0.7071 0 -0.7071 -0.3827 0 -0.9239
  [2,24,-0.7071,0,-0.7071,-0.3827,0,-0.9239],
// 2 24 -0.3827 0 -0.9239 0 0 -1
  [2,24,-0.3827,0,-0.9239,0,0,-1],
// 2 24 0 0 -1 0.3827 0 -0.9239
  [2,24,0,0,-1,0.3827,0,-0.9239],
// 2 24 0.3827 0 -0.9239 0.7071 0 -0.7071
  [2,24,0.3827,0,-0.9239,0.7071,0,-0.7071],
// 2 24 0.7071 0 -0.7071 0.9239 0 -0.3827
  [2,24,0.7071,0,-0.7071,0.9239,0,-0.3827],
// 2 24 0.9239 0 -0.3827 1 0 0
  [2,24,0.9239,0,-0.3827,1,0,0],
];
module ldraw_lib__4_4edge(step=0, col=false, unit=2/5, alt=false, line=0.2, solid=!$preview)
    makepoly(ldraw_lib__4_4edge(solid), step=step, col=col, unit=unit, alt=alt, line=line, solid=solid);
ldraw_lib__4_4edge(line=0.2);
// file: 3004.scad
use <../lib.scad>
use <s/3004s01.scad>
$fa=1; $fs=0.2;
function ldraw_lib__3004(realsolid=false) = [
// 0 Brick  1 x  2
// 0 Name: 3004.dat
// 0 Author: James Jessiman
// 0 !LDRAW_ORG Part UPDATE 2022-05
// 0 !LICENSE Licensed under CC BY 2.0 and CC BY 4.0 : see CAreadme.txt
// 
// 0 BFC CERTIFY CCW
  [0,"BFC","CERTIFY"],
  [0,"BFC","CCW"],
// 
// 0 !HISTORY 2001-10-26 [PTadmin] Official Update 2001-01
// 0 !HISTORY 2002-05-07 {unknown} BFC Certification
// 0 !HISTORY 2002-06-11 [PTadmin] Official Update 2002-03
// 0 !HISTORY 2007-05-07 [PTadmin] Header formatted for Contributor Agreement
// 0 !HISTORY 2008-07-01 [PTadmin] Official Update 2008-01
// 0 !HISTORY 2022-08-04 [MagFors] Using subfile
// 0 !HISTORY 2022-09-15 [PTadmin] Official Update 2022-05
// 
// 
// 1 16 0 0 0 1 0 0 0 1 0 0 0 1 s\3004s01.dat
  [1,16,0,0,0,1,0,0,0,1,0,0,0,1, ldraw_lib__s__3004s01(realsolid)],
// 4 16 -20 24 -10 20 24 -10 20 0 -10 -20 0 -10
  [4,16,-20,24,-10,20,24,-10,20,0,-10,-20,0,-10],
];
module ldraw_lib__3004(step=0, col=false, unit=2/5, alt=false, line=0.2, solid=!$preview)
    makepoly(ldraw_lib__3004(solid), step=step, col=col, unit=unit, alt=alt, line=line, solid=solid);
ldraw_lib__3004(line=0.2);
// file: 71533k03.scad
use <../lib.scad>
use <../p/4-4cyli.scad>
$fa=1; $fs=0.2;
function ldraw_lib__71533k03(realsolid=false) = [
// 0 ~Technic Pneumatic Tube Segment
// 0 Name: 71533k03.dat
// 0 Author: Jaco van der Molen [Jaco]
// 0 !LDRAW_ORG Part Flexible_Section UPDATE 2020-01
// 0 !LICENSE Licensed under CC BY 2.0 and CC BY 4.0 : see CAreadme.txt
// 
// 0 BFC CERTIFY CW
  [0,"BFC","CERTIFY"],
  [0,"BFC","CW"],
// 
// 0 !HISTORY 2003-11-30 [Steffen] BFCed
// 0 !HISTORY 2009-12-29 [PTadmin] Official Update 2009-03
// 0 !HISTORY 2020-06-27 [PTadmin] Renamed from 166
// 0 !HISTORY 2020-06-28 [PTadmin] Official Update 2020-01
// 
// 
// 1 16 0 0 0 5 0 0 0 1 0 0 0 5 4-4cyli.dat
  [1,16,0,0,0,5,0,0,0,1,0,0,0,5, ldraw_lib__4_4cyli(realsolid)],
// 0 BFC INVERTNEXT
  [0,"BFC","INVERTNEXT"],
// 1 16 0 0 0 3 0 0 0 1 0 0 0 3 4-4cyli.dat
  [1,16,0,0,0,3,0,0,0,1,0,0,0,3, ldraw_lib__4_4cyli(realsolid)],
// 0
];
module ldraw_lib__71533k03(step=0, col=false, unit=2/5, alt=false, line=0.2, solid=!$preview)
    makepoly(ldraw_lib__71533k03(solid), step=step, col=col, unit=unit, alt=alt, line=line, solid=solid);
ldraw_lib__71533k03(line=0.2);
// file: 71533k02.scad
use <../lib.scad>
use <../p/4-4edge.scad>
use <../p/4-4ring3.scad>
use <../p/4-4ring4.scad>
$fa=1; $fs=0.2;
function ldraw_lib__71533k02(realsolid=false) = [
// 0 ~Technic Pneumatic Tube End (Non-Bulged)
// 0 Name: 71533k02.dat
// 0 Author: Steffen [Steffen]
// 0 !LDRAW_ORG Part Flexible_Section UPDATE 2020-01
// 0 !LICENSE Licensed under CC BY 2.0 and CC BY 4.0 : see CAreadme.txt
// 
// 0 BFC CERTIFY CCW
  [0,"BFC","CERTIFY"],
  [0,"BFC","CCW"],
// 
// 0 !HISTORY 2020-06-28 [PTadmin] Official Update 2020-01
// 
// 
// 0 // This file goes together with 71533k01.dat and 71533k03.dat.
// 0 // Those 3 files can be used to create Technic Pneumatic Tubes
// 0 // with either bulged or non-bulged ends.
// 
// 1 16 0 0 0 1 0 0 0 1 0 0 0 1 4-4ring3.dat
  [1,16,0,0,0,1,0,0,0,1,0,0,0,1, ldraw_lib__4_4ring3(realsolid)],
// 1 16 0 0 0 1 0 0 0 1 0 0 0 1 4-4ring4.dat
  [1,16,0,0,0,1,0,0,0,1,0,0,0,1, ldraw_lib__4_4ring4(realsolid)],
// 1 16 0 0 0 3 0 0 0 3 0 0 0 3 4-4edge.dat
  [1,16,0,0,0,3,0,0,0,3,0,0,0,3, ldraw_lib__4_4edge(realsolid)],
// 1 16 0 0 0 5 0 0 0 5 0 0 0 5 4-4edge.dat
  [1,16,0,0,0,5,0,0,0,5,0,0,0,5, ldraw_lib__4_4edge(realsolid)],
];
module ldraw_lib__71533k02(step=0, col=false, unit=2/5, alt=false, line=0.2, solid=!$preview)
    makepoly(ldraw_lib__71533k02(solid), step=step, col=col, unit=unit, alt=alt, line=line, solid=solid);
ldraw_lib__71533k02(line=0.2);
// main file
use <../lib.scad>
use <71533k02.scad>
use <71533k03.scad>
$fa=1; $fs=0.2;
function ldraw_lib__21761_f1(realsolid=false) = [
// 0 Technic Pneumatic Tube  3L
// 0 Name: 21761-f1.dat
// 0 Author: Philippe Hurbain [Philo]
// 0 !LDRAW_ORG Part UPDATE 2020-01
// 0 !LICENSE Licensed under CC BY 2.0 and CC BY 4.0 : see CAreadme.txt
// 
// 0 BFC CERTIFY CCW
  [0,"BFC","CERTIFY"],
  [0,"BFC","CCW"],
// 
// 0 !KEYWORDS 24 mm
// 
// 0 !HISTORY 2020-06-28 [PTadmin] Official Update 2020-01
// 
// 
// 1 16 -30 0 0 0 1 0 1 0 0 0 0 1 71533k02.dat
  [1,16,-30,0,0,0,1,0,1,0,0,0,0,1, ldraw_lib__71533k02(realsolid)],
// 1 16 30 0 0 0 -1 0 -1 0 0 0 0 1 71533k02.dat
  [1,16,30,0,0,0,-1,0,-1,0,0,0,0,1, ldraw_lib__71533k02(realsolid)],
// 1 16 -30 0 0 0 60 0 1 0 0 0 0 1 71533k03.dat
  [1,16,-30,0,0,0,60,0,1,0,0,0,0,1, ldraw_lib__71533k03(realsolid)],
];
module ldraw_lib__21761_f1(step=0, col=false, unit=2/5, alt=false, line=0.2, solid=!$preview)
    makepoly(ldraw_lib__21761_f1(solid), step=step, col=col, unit=unit, alt=alt, line=line, solid=solid);
ldraw_lib__21761_f1(line=0.2);
